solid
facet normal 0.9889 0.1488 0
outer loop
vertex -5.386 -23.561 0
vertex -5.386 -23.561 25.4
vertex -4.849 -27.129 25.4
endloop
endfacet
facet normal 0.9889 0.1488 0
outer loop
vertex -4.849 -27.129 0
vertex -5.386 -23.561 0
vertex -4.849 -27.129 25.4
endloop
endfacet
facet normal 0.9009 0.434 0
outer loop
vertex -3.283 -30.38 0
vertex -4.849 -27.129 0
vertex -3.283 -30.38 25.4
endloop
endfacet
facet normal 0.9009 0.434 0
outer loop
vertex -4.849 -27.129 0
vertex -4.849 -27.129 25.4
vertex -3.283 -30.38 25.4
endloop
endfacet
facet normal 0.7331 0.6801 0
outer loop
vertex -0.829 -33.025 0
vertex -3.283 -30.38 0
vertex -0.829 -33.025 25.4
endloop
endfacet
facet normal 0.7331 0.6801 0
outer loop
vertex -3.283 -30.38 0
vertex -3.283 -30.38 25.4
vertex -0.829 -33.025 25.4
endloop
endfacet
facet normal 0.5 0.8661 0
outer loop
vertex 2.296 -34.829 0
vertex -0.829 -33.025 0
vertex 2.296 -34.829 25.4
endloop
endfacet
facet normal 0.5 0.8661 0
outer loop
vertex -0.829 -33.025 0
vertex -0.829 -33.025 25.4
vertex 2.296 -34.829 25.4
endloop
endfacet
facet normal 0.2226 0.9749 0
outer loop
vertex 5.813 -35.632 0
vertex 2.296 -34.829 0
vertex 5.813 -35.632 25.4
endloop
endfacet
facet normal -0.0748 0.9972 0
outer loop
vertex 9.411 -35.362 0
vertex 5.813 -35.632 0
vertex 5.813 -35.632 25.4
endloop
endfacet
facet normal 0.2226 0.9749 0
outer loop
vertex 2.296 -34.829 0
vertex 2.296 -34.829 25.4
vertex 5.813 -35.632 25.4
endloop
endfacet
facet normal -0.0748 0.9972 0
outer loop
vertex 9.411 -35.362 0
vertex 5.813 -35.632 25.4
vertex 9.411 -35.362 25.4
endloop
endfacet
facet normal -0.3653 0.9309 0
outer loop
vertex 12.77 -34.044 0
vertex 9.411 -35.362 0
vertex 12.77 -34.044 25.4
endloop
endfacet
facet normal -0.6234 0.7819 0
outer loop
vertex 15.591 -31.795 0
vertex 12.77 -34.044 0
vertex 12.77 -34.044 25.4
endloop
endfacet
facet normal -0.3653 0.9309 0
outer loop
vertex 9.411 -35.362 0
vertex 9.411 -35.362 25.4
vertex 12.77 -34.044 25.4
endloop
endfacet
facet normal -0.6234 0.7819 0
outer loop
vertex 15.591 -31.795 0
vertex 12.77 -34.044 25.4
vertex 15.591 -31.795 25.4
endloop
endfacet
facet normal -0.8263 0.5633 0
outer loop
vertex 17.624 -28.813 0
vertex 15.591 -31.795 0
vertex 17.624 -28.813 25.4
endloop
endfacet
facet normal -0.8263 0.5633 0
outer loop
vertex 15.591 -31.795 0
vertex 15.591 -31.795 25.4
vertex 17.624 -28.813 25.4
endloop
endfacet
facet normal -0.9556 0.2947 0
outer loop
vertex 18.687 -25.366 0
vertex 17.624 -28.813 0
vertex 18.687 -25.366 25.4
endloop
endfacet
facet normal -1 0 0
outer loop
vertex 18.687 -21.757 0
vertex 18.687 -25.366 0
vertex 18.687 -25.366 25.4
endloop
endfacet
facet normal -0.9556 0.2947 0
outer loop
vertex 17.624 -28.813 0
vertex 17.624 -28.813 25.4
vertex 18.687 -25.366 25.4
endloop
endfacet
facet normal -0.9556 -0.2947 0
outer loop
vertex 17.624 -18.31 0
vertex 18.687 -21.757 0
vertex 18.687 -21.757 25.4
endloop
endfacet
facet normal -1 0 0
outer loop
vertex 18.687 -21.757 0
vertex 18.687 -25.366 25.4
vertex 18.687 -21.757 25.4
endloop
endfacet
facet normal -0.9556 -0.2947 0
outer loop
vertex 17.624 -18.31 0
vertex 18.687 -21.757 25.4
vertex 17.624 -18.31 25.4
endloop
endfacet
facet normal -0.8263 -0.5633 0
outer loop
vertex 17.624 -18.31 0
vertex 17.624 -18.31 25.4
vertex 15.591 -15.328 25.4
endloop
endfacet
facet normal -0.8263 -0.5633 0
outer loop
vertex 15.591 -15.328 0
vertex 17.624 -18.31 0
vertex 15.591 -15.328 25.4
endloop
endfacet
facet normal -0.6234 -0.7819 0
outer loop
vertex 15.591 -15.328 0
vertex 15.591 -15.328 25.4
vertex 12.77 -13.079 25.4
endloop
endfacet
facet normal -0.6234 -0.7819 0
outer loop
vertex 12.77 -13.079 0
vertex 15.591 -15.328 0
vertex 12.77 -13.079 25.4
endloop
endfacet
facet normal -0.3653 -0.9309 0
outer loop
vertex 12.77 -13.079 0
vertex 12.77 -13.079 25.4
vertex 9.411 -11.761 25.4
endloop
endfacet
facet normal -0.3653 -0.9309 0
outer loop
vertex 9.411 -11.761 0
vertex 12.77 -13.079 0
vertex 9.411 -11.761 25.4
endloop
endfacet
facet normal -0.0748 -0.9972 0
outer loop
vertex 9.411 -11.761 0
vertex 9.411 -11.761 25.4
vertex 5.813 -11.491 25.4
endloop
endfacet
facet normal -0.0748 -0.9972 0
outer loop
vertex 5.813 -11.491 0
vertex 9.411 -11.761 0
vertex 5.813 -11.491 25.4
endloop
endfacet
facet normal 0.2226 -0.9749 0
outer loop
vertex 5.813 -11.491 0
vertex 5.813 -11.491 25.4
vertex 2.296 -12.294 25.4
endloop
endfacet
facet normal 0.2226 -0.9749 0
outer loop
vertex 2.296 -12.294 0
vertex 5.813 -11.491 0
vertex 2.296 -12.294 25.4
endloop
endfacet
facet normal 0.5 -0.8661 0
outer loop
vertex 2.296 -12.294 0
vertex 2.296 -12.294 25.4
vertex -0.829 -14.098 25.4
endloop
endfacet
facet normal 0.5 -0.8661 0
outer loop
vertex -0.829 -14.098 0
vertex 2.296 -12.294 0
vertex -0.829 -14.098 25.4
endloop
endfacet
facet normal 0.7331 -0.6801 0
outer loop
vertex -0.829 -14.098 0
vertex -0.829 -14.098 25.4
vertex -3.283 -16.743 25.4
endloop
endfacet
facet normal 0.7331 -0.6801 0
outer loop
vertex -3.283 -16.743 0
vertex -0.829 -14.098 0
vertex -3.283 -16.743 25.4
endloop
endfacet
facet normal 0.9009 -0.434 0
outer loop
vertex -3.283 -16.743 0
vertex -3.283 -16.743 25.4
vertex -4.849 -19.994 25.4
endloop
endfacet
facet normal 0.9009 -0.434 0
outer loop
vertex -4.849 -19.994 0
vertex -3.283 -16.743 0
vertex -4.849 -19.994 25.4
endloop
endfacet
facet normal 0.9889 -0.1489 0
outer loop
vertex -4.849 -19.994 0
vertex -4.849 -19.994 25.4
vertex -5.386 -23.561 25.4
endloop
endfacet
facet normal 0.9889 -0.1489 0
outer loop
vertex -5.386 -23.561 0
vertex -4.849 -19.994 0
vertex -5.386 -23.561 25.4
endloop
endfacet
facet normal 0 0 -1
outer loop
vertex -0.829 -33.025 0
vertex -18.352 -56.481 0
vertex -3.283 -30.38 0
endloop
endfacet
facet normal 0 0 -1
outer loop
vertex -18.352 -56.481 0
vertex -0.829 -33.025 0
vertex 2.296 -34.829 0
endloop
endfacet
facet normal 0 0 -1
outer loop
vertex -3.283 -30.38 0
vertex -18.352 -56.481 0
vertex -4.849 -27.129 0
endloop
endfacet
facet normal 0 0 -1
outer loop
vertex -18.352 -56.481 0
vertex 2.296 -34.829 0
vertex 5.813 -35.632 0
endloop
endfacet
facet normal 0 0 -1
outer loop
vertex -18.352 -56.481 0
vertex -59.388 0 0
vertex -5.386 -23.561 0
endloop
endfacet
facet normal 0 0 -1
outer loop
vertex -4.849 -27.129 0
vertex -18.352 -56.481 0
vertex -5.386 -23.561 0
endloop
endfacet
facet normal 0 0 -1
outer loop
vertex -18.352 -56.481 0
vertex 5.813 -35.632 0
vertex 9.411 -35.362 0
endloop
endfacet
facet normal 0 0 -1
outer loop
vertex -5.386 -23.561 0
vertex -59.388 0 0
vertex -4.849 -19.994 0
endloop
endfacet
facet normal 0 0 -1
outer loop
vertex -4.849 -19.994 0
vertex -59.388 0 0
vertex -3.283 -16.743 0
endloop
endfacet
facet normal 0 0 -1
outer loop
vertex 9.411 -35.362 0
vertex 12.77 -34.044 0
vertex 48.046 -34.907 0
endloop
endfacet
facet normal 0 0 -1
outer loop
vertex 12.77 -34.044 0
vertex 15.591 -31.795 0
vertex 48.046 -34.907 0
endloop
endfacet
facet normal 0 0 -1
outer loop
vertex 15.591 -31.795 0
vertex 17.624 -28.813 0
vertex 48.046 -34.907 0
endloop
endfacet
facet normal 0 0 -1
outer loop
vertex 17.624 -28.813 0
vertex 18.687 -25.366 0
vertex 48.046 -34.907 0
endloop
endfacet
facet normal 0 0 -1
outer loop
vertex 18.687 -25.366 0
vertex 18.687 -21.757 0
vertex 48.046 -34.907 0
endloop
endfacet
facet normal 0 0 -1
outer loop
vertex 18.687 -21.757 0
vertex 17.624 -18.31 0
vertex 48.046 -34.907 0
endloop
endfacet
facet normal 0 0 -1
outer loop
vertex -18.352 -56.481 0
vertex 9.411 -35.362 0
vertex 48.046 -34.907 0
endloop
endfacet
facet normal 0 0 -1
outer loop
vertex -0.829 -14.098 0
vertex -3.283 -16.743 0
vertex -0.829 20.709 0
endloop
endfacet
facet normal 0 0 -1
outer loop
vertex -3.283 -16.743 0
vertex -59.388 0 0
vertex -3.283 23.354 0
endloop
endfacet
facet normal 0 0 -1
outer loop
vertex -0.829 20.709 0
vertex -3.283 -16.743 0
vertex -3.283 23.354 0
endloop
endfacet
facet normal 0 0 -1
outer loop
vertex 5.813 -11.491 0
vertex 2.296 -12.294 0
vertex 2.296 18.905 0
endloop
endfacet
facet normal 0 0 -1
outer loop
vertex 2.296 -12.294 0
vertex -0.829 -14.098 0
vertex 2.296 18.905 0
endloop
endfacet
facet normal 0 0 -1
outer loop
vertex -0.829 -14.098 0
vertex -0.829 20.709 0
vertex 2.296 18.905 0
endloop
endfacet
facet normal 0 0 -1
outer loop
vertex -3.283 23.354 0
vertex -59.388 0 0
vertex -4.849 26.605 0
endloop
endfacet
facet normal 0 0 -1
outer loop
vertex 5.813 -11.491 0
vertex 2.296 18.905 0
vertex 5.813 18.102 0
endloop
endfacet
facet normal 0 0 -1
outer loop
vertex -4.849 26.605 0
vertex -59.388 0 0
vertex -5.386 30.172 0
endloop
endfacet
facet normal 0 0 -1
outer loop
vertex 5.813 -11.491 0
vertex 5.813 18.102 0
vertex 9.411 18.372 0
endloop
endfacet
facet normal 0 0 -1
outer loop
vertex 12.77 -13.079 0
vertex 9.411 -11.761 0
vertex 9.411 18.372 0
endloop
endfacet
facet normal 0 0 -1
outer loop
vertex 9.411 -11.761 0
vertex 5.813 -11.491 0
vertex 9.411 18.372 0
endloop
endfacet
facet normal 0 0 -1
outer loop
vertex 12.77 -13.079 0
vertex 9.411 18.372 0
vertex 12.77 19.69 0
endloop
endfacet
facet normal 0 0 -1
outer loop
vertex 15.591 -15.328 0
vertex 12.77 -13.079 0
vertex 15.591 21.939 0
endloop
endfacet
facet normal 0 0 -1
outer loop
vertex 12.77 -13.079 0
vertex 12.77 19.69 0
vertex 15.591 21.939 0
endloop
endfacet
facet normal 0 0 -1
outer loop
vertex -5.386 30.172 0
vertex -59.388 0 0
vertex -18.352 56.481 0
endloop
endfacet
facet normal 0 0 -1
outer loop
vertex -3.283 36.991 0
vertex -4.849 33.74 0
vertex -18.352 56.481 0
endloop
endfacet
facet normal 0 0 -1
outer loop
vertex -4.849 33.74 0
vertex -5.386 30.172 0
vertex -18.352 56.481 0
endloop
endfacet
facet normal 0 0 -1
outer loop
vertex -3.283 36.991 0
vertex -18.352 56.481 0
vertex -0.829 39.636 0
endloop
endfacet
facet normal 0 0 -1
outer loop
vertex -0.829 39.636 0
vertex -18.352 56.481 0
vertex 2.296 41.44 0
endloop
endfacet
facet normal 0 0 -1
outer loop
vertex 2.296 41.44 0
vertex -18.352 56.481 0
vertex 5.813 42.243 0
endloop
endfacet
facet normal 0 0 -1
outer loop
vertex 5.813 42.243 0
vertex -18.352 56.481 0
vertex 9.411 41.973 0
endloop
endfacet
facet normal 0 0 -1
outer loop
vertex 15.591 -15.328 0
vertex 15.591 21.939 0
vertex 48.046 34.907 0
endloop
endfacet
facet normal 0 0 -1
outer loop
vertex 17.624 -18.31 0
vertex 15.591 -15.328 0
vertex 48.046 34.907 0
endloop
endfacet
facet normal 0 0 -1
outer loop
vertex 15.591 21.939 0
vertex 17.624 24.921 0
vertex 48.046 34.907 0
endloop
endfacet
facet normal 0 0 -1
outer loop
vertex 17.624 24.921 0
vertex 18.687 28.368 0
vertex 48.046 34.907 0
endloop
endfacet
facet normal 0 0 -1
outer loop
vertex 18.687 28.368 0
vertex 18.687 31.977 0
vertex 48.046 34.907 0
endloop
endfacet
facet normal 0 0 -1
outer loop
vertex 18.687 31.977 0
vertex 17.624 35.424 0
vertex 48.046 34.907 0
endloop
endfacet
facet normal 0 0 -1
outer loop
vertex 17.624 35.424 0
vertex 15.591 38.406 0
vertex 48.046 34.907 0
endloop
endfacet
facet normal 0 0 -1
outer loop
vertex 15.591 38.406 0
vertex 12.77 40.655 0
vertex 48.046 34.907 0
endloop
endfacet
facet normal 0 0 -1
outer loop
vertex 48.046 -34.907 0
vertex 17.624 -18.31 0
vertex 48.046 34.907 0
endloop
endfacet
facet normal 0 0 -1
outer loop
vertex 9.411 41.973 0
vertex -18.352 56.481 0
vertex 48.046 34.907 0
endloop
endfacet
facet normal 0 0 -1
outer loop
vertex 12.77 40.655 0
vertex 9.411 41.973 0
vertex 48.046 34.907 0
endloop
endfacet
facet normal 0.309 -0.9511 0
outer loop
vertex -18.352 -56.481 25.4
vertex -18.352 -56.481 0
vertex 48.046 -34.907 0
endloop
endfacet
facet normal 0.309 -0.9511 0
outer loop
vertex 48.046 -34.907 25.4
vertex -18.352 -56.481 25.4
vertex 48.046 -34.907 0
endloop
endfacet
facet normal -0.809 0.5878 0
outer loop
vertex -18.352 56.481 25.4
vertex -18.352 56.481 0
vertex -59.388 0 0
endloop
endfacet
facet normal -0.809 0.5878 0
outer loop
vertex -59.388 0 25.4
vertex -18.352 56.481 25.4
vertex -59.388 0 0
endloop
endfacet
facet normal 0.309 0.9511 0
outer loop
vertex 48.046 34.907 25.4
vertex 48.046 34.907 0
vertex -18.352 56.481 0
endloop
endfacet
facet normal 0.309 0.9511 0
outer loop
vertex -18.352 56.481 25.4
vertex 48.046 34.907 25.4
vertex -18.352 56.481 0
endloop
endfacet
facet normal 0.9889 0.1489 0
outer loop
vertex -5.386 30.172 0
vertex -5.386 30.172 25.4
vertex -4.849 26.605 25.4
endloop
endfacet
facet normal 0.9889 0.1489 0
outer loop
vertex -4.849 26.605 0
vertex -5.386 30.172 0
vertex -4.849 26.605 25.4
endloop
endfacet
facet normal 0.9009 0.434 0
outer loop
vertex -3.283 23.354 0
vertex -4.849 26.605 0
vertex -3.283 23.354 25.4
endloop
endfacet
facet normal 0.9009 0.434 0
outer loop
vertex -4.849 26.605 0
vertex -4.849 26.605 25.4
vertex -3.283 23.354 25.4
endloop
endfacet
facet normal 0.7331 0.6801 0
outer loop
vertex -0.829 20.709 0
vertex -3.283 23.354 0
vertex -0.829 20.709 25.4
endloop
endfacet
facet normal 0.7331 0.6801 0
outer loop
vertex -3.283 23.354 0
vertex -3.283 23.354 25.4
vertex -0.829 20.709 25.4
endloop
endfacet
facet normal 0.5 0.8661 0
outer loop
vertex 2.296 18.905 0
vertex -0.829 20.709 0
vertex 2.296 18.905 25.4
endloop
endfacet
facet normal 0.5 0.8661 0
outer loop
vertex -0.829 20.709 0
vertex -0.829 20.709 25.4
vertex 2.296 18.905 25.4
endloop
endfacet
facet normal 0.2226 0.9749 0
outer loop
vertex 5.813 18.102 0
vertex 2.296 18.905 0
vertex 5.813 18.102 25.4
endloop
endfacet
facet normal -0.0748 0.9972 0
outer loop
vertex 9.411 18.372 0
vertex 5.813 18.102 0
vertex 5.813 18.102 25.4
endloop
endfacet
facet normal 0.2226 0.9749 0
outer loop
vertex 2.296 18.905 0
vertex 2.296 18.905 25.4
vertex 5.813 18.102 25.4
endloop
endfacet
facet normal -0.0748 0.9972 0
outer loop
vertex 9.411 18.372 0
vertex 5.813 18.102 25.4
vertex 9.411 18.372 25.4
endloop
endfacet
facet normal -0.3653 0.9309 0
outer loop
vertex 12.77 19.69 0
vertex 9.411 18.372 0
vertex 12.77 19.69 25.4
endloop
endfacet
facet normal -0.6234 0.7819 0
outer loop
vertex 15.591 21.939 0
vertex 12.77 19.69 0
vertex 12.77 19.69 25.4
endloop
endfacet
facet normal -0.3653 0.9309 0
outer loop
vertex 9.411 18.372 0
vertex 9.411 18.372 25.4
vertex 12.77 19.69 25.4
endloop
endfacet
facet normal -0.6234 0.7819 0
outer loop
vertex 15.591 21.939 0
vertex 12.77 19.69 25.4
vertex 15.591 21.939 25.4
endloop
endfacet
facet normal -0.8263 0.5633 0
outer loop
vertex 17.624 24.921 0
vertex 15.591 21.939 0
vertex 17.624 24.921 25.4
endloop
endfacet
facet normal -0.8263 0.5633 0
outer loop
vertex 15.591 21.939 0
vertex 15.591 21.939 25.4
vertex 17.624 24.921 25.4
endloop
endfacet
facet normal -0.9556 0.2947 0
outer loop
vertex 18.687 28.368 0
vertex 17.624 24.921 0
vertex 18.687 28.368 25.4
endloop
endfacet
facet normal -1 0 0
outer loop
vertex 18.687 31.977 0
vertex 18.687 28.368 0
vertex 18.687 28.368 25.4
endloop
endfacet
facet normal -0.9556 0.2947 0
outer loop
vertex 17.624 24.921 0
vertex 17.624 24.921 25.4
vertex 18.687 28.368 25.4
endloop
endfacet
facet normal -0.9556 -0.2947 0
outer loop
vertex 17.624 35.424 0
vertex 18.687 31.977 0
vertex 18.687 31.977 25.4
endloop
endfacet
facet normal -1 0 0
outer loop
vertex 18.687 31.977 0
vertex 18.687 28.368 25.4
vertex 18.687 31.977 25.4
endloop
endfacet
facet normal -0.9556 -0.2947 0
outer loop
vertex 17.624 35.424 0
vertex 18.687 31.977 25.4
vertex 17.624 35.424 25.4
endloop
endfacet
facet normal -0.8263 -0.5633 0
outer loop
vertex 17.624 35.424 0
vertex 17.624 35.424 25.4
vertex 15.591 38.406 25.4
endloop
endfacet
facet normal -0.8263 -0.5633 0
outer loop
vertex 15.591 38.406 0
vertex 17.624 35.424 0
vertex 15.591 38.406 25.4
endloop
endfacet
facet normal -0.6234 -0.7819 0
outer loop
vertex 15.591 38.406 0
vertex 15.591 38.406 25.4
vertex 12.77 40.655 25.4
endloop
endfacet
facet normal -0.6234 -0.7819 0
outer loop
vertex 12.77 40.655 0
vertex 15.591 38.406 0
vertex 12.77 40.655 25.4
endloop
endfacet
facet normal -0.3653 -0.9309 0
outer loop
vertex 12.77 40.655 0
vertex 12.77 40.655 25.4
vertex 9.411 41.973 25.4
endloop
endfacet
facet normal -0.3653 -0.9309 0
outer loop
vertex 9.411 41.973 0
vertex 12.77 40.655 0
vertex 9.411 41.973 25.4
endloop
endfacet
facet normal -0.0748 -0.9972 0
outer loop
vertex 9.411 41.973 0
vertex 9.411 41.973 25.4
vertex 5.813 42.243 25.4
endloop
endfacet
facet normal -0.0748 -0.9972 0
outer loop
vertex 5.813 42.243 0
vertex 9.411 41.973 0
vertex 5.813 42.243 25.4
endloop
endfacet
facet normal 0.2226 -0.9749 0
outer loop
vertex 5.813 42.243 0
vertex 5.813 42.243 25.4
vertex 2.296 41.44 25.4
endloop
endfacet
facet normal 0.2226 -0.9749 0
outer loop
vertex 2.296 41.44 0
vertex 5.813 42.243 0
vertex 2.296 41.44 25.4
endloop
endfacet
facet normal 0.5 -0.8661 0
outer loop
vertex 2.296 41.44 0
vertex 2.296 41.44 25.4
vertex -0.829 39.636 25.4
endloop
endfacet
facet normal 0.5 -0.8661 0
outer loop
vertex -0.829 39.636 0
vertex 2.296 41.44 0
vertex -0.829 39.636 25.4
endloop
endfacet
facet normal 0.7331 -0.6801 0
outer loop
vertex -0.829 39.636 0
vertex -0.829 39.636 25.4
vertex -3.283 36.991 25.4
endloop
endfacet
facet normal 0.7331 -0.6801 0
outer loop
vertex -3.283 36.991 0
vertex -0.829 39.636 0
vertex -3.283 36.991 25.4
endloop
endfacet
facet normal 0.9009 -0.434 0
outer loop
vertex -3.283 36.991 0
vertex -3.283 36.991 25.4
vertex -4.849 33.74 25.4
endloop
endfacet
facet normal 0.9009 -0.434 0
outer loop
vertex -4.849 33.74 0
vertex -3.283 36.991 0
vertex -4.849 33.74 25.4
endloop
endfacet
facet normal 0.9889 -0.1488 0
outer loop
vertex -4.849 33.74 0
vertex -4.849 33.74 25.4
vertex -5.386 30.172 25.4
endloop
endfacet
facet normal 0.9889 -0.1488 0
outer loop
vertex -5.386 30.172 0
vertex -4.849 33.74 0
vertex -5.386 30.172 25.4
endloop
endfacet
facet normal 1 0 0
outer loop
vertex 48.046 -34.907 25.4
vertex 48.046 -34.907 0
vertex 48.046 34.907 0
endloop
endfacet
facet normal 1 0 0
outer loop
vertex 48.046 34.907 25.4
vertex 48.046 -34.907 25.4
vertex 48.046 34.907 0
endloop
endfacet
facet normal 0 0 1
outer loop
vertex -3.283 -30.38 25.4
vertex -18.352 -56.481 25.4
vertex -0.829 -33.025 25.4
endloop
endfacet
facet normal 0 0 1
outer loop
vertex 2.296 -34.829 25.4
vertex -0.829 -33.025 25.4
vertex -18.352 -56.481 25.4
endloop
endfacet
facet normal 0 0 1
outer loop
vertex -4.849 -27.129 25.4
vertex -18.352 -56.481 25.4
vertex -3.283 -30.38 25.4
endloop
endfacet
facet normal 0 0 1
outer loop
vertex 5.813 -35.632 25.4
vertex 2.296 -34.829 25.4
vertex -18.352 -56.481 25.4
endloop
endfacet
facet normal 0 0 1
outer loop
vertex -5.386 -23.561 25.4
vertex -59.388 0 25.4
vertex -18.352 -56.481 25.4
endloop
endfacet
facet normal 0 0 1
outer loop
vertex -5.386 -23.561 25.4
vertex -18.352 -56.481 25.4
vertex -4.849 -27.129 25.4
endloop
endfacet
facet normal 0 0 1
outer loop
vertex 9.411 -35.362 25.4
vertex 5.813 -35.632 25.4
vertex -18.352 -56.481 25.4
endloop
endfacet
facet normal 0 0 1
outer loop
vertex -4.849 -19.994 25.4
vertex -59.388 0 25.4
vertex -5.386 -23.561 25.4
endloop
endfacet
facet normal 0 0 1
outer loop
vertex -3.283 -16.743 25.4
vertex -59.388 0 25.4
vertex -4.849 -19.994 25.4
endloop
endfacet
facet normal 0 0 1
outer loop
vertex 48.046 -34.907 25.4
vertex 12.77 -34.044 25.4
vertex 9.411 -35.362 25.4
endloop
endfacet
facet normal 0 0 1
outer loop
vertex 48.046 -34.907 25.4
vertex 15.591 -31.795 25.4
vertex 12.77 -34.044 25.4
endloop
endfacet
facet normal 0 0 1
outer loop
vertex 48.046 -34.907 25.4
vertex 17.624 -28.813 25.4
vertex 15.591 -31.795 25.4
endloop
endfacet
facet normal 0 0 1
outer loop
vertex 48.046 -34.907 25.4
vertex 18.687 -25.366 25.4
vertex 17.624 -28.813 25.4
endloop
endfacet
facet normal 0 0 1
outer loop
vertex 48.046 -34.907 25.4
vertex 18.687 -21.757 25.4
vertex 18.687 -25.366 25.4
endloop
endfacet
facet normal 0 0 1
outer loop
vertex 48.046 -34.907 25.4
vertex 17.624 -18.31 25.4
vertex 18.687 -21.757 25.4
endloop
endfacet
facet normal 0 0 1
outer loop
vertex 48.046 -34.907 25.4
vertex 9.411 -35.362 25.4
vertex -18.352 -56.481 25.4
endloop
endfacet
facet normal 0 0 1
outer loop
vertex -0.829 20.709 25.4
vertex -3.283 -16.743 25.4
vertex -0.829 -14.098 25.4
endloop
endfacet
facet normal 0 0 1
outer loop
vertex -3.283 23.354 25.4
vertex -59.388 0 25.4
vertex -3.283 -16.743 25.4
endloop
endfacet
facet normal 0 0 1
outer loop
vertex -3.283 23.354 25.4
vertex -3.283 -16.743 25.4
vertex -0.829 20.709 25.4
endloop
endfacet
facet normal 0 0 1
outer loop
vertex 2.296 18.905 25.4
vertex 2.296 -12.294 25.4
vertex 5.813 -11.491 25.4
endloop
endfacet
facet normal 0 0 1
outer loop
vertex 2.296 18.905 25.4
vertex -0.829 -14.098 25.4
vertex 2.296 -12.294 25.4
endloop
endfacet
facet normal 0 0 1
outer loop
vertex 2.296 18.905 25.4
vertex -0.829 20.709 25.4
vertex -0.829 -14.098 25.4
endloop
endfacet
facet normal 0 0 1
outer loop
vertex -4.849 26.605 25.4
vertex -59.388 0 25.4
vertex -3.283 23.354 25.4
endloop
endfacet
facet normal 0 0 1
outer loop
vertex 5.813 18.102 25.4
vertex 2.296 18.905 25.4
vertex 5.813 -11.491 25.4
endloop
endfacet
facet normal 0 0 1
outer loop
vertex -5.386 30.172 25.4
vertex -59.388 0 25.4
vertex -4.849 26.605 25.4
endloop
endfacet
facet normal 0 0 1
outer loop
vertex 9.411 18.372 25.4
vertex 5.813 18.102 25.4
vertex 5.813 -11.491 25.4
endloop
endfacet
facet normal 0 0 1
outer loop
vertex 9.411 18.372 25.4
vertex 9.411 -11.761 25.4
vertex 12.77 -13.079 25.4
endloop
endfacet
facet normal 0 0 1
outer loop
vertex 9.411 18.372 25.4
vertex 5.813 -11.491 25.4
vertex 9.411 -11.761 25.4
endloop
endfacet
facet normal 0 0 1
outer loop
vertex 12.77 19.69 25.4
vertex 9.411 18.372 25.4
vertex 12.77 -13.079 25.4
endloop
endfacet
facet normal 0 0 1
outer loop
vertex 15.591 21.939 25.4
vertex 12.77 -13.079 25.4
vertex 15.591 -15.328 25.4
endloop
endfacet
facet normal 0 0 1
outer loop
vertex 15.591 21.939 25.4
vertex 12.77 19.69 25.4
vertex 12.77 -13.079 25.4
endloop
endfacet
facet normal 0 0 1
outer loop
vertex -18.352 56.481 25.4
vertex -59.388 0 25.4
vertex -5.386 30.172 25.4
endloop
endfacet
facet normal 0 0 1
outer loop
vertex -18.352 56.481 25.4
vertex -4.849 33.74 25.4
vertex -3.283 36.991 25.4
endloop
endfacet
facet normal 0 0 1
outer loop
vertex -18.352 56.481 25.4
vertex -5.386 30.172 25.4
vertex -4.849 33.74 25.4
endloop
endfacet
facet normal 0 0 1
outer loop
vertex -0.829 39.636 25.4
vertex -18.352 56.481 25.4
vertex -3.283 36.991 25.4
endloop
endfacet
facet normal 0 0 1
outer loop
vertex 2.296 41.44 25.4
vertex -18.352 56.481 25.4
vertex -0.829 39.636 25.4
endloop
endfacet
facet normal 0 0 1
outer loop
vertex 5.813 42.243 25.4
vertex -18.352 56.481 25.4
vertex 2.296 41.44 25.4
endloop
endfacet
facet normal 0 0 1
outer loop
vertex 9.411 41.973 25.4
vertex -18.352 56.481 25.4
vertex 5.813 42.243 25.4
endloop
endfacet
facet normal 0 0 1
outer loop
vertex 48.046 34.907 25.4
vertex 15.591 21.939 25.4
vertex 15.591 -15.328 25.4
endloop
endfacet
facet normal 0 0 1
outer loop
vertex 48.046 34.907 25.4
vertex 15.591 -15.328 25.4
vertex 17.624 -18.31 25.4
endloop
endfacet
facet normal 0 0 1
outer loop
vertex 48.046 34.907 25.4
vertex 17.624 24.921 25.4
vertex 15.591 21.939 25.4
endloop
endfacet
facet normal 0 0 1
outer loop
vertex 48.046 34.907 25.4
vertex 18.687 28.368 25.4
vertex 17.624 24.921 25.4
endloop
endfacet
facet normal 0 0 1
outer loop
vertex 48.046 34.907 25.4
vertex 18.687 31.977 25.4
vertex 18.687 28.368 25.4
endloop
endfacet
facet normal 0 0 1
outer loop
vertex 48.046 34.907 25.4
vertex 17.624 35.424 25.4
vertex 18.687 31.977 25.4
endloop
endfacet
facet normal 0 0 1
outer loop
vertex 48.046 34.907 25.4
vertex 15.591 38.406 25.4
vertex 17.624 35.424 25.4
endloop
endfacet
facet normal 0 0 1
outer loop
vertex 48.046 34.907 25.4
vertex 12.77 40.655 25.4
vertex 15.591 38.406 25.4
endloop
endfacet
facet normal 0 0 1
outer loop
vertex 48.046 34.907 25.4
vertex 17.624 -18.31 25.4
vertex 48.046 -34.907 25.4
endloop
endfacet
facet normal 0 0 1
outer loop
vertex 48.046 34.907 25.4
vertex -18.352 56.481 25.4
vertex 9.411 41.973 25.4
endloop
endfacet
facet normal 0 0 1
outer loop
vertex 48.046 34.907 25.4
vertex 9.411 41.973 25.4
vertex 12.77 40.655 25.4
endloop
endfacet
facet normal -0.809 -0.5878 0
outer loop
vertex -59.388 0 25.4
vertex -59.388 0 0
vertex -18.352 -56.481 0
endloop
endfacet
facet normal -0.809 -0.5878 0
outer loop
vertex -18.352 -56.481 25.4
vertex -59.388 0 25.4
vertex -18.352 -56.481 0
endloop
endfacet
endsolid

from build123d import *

# Parameters (mm, degrees)
F1_DEPTH = 25.4
F3_D     = 24.20874


with BuildPart() as f1:
    # F0 (on Top) → F1 (new body)
    with BuildSketch(Plane.XY):
        Polygon((48.0459555984, -34.9074300409), (48.0459555984, 34.9074300409), (-18.3519220166, 56.481408266), (-59.3880671635, 0), (-18.3519220166, -56.481408266), align=None)
    extrude(amount=F1_DEPTH)

    # F3 (through all)
    with Locations(Plane(origin=(0, 0, 0), x_dir=(1, 0, 0), z_dir=(0, 0, -1))):
        with Locations((6.7180017941, 23.5614608973), (6.7180017941, -30.1724821329)):
            Hole(F3_D / 2)


solid = f1.part
